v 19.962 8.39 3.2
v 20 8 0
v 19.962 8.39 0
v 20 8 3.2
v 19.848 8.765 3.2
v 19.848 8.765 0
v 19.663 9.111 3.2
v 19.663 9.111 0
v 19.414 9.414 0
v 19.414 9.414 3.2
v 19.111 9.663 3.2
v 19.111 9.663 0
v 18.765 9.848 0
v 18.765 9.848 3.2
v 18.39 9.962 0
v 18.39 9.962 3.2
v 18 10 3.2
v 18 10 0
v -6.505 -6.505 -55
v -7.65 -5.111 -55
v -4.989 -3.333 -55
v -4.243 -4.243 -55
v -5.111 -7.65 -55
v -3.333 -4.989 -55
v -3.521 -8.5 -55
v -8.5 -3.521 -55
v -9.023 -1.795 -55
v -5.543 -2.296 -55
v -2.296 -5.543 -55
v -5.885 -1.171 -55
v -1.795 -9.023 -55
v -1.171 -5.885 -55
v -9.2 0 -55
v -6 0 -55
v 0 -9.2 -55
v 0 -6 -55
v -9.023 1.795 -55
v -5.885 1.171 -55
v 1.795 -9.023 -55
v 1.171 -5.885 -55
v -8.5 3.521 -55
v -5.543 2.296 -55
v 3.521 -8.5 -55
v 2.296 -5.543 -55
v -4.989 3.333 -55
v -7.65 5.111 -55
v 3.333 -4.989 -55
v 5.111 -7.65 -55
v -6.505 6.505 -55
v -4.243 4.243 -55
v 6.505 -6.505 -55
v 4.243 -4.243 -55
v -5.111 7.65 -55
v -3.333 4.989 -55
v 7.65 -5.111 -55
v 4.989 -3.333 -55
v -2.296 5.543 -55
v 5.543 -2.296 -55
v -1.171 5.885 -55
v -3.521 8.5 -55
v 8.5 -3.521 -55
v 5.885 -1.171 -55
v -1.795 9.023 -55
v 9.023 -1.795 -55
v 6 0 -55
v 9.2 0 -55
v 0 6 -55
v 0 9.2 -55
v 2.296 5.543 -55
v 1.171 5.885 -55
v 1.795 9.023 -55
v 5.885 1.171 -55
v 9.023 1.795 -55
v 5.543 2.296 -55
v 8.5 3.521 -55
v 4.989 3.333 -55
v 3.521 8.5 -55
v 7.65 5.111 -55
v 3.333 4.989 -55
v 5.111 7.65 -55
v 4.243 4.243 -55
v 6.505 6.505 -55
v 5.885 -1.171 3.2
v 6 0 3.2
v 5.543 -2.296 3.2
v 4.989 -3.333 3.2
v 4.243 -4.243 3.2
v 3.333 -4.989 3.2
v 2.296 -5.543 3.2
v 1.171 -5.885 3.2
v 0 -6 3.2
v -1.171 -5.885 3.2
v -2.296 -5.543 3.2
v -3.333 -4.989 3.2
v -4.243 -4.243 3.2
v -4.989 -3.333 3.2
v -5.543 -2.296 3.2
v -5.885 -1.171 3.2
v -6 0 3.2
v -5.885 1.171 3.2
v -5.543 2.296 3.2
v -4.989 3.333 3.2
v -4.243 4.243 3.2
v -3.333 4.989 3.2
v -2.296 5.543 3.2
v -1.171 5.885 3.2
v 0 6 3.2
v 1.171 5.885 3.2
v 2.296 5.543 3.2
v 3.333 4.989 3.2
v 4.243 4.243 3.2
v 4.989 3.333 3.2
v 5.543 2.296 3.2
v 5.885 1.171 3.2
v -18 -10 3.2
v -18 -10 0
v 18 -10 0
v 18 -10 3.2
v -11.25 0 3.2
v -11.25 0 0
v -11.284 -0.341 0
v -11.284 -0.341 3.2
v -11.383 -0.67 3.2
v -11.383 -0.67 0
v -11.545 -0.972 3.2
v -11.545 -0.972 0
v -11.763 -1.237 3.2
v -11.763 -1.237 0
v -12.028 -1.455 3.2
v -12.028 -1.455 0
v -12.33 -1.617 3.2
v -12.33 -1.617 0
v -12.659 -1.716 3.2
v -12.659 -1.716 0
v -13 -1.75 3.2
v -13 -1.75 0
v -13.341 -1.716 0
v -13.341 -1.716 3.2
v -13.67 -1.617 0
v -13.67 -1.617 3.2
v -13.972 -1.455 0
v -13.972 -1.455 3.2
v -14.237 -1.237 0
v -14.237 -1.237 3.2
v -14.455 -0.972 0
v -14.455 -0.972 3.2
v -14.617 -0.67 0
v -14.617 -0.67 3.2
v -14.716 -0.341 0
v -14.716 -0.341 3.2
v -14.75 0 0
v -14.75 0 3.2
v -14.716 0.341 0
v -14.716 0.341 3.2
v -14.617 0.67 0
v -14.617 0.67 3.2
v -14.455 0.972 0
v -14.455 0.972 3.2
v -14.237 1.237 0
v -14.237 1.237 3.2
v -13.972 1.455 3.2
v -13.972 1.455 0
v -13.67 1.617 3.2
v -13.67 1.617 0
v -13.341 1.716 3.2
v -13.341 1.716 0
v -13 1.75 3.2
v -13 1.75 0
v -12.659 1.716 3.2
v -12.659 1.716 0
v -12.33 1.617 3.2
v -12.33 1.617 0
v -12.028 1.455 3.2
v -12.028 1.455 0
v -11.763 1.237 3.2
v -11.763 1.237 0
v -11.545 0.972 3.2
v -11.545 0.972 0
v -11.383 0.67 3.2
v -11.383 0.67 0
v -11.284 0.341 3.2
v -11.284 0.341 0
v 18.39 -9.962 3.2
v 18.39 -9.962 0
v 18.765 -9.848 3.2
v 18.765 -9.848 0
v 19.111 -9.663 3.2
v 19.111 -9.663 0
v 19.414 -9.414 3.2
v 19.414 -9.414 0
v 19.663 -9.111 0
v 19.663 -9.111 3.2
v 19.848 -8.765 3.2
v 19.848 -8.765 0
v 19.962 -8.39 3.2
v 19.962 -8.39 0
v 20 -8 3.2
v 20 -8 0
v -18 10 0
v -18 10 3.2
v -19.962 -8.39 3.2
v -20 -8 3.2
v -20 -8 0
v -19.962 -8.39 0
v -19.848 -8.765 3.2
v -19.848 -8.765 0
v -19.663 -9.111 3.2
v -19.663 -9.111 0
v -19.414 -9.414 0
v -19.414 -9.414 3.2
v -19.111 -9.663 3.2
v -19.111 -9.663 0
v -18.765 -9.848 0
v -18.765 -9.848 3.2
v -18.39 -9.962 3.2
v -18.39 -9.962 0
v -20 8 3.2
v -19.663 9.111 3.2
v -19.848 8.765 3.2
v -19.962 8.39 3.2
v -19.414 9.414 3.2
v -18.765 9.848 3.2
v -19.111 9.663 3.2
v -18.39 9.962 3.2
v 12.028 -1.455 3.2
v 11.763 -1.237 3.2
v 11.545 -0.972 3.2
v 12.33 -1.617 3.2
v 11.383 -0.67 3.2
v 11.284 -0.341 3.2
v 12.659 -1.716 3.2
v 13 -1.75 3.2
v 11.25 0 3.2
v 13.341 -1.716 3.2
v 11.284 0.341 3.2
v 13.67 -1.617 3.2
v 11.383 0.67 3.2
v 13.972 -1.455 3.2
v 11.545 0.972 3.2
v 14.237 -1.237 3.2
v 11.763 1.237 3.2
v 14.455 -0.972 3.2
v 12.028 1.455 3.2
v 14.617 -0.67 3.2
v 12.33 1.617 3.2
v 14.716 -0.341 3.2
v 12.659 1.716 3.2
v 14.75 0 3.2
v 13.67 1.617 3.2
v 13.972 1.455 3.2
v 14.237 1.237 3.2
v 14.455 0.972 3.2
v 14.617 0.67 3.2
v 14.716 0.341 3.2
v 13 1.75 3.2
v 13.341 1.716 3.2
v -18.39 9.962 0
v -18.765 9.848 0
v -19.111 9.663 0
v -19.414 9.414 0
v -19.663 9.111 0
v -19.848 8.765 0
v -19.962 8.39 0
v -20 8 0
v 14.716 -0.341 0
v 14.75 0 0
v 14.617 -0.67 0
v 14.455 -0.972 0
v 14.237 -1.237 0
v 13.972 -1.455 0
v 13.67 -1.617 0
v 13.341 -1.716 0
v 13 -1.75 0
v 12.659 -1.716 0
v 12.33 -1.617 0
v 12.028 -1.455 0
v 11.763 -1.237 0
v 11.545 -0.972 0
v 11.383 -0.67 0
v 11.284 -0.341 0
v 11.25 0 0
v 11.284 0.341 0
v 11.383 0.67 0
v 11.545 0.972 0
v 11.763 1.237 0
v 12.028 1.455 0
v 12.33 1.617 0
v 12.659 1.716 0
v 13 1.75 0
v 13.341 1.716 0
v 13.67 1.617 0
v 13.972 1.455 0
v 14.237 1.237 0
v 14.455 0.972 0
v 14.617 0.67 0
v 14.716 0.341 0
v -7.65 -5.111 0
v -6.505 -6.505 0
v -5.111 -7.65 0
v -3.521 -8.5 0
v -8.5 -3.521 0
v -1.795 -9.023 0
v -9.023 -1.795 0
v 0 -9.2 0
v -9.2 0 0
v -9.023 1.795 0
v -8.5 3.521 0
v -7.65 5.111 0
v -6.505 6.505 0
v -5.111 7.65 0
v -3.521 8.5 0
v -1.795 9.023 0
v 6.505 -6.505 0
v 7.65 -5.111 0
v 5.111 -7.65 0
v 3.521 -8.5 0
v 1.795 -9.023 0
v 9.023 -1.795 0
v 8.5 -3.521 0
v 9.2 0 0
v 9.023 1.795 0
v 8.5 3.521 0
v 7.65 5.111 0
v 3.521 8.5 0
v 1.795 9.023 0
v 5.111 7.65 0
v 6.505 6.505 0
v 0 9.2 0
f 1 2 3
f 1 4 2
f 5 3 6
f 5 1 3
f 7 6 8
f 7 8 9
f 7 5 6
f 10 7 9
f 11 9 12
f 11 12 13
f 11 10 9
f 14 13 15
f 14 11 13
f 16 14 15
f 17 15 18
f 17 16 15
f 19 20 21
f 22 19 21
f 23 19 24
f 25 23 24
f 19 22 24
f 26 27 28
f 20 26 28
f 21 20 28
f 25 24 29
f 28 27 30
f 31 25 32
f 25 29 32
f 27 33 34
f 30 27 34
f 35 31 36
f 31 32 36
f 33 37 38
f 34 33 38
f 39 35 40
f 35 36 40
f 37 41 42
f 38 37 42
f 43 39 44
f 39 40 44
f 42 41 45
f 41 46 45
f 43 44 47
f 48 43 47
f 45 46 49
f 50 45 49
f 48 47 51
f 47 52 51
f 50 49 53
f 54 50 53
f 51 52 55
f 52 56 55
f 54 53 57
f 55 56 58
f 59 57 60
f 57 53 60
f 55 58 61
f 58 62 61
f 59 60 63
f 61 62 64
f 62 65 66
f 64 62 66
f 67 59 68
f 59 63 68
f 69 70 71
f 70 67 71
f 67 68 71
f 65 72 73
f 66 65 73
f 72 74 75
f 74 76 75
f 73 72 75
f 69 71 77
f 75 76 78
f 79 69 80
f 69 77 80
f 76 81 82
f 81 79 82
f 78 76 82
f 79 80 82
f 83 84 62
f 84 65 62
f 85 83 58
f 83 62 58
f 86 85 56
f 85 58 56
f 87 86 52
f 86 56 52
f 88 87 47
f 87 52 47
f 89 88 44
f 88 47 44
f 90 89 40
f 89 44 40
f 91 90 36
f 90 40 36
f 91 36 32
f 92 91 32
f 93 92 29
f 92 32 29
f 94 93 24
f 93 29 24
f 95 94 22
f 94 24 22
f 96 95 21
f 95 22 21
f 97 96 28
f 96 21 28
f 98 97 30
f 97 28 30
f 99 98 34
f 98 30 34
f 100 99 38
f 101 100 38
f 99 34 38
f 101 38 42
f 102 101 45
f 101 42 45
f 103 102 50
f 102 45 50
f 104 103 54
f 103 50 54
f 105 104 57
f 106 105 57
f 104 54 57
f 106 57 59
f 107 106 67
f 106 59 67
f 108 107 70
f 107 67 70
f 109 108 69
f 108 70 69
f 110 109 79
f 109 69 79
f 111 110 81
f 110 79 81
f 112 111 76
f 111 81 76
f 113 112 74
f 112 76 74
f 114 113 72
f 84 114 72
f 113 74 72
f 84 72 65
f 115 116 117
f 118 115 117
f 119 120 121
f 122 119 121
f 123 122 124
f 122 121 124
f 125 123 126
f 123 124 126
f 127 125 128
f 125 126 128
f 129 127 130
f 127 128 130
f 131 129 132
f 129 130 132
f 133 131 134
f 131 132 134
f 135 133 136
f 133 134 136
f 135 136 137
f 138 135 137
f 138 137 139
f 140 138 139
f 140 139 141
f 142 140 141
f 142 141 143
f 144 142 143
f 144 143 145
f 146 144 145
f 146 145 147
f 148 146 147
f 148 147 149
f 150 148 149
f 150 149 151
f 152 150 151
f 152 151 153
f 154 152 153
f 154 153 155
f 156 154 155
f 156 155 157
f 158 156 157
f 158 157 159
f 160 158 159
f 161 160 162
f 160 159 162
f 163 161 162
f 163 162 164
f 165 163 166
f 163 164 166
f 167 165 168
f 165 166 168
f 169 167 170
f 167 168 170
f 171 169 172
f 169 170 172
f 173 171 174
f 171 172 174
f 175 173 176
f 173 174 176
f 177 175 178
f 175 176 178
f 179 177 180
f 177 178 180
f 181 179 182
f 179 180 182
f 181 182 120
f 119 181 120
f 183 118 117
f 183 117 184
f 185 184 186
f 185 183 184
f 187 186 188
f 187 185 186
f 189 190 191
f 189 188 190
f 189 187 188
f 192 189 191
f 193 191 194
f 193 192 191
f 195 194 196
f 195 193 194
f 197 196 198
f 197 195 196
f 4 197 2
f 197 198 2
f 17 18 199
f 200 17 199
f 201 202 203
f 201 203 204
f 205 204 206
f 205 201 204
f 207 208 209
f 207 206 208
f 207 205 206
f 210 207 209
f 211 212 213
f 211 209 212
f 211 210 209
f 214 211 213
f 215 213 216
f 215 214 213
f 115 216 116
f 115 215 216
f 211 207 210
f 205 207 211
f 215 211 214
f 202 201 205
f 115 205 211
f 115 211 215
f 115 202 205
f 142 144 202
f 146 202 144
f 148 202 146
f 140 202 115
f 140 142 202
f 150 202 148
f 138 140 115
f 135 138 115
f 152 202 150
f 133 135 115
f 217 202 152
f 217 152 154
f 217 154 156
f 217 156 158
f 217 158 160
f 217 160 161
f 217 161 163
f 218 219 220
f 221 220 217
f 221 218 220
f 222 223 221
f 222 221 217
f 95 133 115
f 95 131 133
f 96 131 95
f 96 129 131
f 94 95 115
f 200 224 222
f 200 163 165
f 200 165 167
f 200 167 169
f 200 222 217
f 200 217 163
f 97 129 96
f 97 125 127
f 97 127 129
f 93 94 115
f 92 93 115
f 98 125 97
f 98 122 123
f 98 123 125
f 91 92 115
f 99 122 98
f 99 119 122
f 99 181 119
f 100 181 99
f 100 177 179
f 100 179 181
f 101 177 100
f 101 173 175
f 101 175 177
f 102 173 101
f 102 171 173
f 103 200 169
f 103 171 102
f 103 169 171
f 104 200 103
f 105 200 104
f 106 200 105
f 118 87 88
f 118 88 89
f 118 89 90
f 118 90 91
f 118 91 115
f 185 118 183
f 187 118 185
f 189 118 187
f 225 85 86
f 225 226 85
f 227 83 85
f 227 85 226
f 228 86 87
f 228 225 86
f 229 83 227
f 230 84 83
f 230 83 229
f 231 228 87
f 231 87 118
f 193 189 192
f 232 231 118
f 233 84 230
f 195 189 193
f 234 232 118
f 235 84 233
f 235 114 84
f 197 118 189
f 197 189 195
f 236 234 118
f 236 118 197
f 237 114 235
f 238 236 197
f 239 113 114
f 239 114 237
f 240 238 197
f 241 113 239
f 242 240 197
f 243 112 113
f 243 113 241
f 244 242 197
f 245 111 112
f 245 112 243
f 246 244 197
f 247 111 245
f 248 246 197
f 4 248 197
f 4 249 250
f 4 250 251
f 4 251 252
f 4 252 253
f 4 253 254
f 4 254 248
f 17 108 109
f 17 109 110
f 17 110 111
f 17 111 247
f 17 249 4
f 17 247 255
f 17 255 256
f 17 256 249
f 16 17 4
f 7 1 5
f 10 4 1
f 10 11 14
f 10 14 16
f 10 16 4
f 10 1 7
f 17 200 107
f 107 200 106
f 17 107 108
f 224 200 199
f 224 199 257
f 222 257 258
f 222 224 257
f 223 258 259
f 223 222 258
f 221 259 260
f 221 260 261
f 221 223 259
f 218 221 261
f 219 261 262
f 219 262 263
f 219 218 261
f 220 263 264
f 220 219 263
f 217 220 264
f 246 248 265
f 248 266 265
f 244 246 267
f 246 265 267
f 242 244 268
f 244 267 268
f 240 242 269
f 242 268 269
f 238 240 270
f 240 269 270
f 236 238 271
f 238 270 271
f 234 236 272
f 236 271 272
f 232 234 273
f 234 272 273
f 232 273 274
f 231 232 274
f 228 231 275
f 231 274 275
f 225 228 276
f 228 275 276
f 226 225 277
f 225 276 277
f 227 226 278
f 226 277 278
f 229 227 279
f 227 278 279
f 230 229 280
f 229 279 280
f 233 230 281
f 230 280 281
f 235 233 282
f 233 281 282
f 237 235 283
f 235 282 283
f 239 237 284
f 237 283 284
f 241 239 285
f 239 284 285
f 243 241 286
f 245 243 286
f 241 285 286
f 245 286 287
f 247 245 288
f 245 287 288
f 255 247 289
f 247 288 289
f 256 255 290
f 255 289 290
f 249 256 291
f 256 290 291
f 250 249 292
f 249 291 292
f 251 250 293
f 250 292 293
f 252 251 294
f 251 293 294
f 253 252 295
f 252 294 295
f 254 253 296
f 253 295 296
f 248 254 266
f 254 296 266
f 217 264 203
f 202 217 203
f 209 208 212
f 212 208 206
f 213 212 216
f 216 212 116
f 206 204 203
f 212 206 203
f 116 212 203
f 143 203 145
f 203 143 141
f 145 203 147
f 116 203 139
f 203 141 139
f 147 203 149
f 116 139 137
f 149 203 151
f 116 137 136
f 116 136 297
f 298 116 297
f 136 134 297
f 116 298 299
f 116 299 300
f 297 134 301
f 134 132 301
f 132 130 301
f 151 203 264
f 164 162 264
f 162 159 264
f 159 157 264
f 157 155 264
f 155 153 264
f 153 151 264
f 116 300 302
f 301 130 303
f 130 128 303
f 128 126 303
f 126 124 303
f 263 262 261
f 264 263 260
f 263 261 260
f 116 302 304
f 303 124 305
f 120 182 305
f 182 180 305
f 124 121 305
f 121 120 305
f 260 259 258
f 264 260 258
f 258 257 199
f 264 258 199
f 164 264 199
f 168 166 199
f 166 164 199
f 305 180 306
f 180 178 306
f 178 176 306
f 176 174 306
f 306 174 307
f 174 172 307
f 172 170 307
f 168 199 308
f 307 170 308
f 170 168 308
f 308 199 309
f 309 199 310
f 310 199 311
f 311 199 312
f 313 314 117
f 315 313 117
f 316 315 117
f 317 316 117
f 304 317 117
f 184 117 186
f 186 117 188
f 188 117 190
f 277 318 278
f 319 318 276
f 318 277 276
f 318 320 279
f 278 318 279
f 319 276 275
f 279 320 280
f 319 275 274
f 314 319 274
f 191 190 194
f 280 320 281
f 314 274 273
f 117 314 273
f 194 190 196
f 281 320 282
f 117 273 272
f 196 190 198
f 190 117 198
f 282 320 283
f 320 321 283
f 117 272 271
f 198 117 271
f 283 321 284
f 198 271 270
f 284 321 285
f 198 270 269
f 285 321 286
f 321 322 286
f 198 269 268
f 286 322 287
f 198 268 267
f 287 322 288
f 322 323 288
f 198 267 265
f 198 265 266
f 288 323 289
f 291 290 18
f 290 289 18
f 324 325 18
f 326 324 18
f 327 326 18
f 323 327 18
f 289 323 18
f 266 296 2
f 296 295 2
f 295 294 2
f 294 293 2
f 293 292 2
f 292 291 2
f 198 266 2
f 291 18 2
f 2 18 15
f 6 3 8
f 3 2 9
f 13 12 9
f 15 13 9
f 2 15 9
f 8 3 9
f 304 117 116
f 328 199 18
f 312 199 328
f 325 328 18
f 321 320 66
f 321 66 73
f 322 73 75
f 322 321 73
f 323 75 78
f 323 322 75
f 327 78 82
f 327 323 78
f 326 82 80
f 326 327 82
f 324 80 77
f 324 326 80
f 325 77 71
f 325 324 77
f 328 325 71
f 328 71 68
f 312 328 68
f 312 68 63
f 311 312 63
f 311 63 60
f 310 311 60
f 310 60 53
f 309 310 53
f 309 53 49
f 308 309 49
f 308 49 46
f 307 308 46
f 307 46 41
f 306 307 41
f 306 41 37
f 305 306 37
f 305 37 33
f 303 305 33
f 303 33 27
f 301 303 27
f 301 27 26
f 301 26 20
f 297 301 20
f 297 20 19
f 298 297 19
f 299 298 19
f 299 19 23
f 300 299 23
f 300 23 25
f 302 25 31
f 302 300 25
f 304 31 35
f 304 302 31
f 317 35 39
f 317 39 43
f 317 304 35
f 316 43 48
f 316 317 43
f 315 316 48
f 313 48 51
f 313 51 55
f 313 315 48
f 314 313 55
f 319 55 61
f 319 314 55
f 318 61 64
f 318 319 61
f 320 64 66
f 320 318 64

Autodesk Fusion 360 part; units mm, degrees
sketch "support" plane through (0, 0, 0) normal (0, 0, 1) x (1, 0, 0)
  line L0 (20, 10) -> (-20, 10)
  line L1 (-20, 10) -> (-20, -10)
  line L2 (-20, -10) -> (20, -10)
  line L3 (20, -10) -> (20, 10)
  line L4 (20, 10) -> (-20, -10) construction
  line L5 (-20, 10) -> (20, -10) construction
  circle A0 centre (0, 0) radius 6
  line L6 (-20, 0) -> (20, 0)
  circle A1 centre (-13, 0) radius 1.75
  line L7 (0, 10) -> (0, -10)
  circle A2 centre (13, 0) radius 1.75
  circle A3 centre (0, 0) radius 9.2
  dimension "d1" = 40
  dimension "d2" = 20
  dimension "d3" = 12
  dimension "d4" = 3.5
  dimension "d5" = 7
  dimension "d10" = 3.2
extrude "Extrude1" add sketch "support" along normal blind 3.2 contours L0 L3 L6 L7 A2 A3 | L0 L1 L6 A1 L7 A3 | L2 L3 L6 L7 A2 A3 | A0 L6 L7 A3 | A0 L6 L7 A3 | L1 L2 L6 A1 L7 A3 | A0 L6 L7 A3 | A0 L6 L7 A3
extrude "Extrude3" add sketch "support" against normal blind 55 contours A0 L6 L7 A3 | A0 L6 L7 A3 | A0 L6 L7 A3 | A0 L6 L7 A3
fillet "Fillet1" radius 2 4 edges at (20, 10, 1.6) (20, -10, 1.6) (-20, 10, 1.6) (-20, -10, 1.6)
